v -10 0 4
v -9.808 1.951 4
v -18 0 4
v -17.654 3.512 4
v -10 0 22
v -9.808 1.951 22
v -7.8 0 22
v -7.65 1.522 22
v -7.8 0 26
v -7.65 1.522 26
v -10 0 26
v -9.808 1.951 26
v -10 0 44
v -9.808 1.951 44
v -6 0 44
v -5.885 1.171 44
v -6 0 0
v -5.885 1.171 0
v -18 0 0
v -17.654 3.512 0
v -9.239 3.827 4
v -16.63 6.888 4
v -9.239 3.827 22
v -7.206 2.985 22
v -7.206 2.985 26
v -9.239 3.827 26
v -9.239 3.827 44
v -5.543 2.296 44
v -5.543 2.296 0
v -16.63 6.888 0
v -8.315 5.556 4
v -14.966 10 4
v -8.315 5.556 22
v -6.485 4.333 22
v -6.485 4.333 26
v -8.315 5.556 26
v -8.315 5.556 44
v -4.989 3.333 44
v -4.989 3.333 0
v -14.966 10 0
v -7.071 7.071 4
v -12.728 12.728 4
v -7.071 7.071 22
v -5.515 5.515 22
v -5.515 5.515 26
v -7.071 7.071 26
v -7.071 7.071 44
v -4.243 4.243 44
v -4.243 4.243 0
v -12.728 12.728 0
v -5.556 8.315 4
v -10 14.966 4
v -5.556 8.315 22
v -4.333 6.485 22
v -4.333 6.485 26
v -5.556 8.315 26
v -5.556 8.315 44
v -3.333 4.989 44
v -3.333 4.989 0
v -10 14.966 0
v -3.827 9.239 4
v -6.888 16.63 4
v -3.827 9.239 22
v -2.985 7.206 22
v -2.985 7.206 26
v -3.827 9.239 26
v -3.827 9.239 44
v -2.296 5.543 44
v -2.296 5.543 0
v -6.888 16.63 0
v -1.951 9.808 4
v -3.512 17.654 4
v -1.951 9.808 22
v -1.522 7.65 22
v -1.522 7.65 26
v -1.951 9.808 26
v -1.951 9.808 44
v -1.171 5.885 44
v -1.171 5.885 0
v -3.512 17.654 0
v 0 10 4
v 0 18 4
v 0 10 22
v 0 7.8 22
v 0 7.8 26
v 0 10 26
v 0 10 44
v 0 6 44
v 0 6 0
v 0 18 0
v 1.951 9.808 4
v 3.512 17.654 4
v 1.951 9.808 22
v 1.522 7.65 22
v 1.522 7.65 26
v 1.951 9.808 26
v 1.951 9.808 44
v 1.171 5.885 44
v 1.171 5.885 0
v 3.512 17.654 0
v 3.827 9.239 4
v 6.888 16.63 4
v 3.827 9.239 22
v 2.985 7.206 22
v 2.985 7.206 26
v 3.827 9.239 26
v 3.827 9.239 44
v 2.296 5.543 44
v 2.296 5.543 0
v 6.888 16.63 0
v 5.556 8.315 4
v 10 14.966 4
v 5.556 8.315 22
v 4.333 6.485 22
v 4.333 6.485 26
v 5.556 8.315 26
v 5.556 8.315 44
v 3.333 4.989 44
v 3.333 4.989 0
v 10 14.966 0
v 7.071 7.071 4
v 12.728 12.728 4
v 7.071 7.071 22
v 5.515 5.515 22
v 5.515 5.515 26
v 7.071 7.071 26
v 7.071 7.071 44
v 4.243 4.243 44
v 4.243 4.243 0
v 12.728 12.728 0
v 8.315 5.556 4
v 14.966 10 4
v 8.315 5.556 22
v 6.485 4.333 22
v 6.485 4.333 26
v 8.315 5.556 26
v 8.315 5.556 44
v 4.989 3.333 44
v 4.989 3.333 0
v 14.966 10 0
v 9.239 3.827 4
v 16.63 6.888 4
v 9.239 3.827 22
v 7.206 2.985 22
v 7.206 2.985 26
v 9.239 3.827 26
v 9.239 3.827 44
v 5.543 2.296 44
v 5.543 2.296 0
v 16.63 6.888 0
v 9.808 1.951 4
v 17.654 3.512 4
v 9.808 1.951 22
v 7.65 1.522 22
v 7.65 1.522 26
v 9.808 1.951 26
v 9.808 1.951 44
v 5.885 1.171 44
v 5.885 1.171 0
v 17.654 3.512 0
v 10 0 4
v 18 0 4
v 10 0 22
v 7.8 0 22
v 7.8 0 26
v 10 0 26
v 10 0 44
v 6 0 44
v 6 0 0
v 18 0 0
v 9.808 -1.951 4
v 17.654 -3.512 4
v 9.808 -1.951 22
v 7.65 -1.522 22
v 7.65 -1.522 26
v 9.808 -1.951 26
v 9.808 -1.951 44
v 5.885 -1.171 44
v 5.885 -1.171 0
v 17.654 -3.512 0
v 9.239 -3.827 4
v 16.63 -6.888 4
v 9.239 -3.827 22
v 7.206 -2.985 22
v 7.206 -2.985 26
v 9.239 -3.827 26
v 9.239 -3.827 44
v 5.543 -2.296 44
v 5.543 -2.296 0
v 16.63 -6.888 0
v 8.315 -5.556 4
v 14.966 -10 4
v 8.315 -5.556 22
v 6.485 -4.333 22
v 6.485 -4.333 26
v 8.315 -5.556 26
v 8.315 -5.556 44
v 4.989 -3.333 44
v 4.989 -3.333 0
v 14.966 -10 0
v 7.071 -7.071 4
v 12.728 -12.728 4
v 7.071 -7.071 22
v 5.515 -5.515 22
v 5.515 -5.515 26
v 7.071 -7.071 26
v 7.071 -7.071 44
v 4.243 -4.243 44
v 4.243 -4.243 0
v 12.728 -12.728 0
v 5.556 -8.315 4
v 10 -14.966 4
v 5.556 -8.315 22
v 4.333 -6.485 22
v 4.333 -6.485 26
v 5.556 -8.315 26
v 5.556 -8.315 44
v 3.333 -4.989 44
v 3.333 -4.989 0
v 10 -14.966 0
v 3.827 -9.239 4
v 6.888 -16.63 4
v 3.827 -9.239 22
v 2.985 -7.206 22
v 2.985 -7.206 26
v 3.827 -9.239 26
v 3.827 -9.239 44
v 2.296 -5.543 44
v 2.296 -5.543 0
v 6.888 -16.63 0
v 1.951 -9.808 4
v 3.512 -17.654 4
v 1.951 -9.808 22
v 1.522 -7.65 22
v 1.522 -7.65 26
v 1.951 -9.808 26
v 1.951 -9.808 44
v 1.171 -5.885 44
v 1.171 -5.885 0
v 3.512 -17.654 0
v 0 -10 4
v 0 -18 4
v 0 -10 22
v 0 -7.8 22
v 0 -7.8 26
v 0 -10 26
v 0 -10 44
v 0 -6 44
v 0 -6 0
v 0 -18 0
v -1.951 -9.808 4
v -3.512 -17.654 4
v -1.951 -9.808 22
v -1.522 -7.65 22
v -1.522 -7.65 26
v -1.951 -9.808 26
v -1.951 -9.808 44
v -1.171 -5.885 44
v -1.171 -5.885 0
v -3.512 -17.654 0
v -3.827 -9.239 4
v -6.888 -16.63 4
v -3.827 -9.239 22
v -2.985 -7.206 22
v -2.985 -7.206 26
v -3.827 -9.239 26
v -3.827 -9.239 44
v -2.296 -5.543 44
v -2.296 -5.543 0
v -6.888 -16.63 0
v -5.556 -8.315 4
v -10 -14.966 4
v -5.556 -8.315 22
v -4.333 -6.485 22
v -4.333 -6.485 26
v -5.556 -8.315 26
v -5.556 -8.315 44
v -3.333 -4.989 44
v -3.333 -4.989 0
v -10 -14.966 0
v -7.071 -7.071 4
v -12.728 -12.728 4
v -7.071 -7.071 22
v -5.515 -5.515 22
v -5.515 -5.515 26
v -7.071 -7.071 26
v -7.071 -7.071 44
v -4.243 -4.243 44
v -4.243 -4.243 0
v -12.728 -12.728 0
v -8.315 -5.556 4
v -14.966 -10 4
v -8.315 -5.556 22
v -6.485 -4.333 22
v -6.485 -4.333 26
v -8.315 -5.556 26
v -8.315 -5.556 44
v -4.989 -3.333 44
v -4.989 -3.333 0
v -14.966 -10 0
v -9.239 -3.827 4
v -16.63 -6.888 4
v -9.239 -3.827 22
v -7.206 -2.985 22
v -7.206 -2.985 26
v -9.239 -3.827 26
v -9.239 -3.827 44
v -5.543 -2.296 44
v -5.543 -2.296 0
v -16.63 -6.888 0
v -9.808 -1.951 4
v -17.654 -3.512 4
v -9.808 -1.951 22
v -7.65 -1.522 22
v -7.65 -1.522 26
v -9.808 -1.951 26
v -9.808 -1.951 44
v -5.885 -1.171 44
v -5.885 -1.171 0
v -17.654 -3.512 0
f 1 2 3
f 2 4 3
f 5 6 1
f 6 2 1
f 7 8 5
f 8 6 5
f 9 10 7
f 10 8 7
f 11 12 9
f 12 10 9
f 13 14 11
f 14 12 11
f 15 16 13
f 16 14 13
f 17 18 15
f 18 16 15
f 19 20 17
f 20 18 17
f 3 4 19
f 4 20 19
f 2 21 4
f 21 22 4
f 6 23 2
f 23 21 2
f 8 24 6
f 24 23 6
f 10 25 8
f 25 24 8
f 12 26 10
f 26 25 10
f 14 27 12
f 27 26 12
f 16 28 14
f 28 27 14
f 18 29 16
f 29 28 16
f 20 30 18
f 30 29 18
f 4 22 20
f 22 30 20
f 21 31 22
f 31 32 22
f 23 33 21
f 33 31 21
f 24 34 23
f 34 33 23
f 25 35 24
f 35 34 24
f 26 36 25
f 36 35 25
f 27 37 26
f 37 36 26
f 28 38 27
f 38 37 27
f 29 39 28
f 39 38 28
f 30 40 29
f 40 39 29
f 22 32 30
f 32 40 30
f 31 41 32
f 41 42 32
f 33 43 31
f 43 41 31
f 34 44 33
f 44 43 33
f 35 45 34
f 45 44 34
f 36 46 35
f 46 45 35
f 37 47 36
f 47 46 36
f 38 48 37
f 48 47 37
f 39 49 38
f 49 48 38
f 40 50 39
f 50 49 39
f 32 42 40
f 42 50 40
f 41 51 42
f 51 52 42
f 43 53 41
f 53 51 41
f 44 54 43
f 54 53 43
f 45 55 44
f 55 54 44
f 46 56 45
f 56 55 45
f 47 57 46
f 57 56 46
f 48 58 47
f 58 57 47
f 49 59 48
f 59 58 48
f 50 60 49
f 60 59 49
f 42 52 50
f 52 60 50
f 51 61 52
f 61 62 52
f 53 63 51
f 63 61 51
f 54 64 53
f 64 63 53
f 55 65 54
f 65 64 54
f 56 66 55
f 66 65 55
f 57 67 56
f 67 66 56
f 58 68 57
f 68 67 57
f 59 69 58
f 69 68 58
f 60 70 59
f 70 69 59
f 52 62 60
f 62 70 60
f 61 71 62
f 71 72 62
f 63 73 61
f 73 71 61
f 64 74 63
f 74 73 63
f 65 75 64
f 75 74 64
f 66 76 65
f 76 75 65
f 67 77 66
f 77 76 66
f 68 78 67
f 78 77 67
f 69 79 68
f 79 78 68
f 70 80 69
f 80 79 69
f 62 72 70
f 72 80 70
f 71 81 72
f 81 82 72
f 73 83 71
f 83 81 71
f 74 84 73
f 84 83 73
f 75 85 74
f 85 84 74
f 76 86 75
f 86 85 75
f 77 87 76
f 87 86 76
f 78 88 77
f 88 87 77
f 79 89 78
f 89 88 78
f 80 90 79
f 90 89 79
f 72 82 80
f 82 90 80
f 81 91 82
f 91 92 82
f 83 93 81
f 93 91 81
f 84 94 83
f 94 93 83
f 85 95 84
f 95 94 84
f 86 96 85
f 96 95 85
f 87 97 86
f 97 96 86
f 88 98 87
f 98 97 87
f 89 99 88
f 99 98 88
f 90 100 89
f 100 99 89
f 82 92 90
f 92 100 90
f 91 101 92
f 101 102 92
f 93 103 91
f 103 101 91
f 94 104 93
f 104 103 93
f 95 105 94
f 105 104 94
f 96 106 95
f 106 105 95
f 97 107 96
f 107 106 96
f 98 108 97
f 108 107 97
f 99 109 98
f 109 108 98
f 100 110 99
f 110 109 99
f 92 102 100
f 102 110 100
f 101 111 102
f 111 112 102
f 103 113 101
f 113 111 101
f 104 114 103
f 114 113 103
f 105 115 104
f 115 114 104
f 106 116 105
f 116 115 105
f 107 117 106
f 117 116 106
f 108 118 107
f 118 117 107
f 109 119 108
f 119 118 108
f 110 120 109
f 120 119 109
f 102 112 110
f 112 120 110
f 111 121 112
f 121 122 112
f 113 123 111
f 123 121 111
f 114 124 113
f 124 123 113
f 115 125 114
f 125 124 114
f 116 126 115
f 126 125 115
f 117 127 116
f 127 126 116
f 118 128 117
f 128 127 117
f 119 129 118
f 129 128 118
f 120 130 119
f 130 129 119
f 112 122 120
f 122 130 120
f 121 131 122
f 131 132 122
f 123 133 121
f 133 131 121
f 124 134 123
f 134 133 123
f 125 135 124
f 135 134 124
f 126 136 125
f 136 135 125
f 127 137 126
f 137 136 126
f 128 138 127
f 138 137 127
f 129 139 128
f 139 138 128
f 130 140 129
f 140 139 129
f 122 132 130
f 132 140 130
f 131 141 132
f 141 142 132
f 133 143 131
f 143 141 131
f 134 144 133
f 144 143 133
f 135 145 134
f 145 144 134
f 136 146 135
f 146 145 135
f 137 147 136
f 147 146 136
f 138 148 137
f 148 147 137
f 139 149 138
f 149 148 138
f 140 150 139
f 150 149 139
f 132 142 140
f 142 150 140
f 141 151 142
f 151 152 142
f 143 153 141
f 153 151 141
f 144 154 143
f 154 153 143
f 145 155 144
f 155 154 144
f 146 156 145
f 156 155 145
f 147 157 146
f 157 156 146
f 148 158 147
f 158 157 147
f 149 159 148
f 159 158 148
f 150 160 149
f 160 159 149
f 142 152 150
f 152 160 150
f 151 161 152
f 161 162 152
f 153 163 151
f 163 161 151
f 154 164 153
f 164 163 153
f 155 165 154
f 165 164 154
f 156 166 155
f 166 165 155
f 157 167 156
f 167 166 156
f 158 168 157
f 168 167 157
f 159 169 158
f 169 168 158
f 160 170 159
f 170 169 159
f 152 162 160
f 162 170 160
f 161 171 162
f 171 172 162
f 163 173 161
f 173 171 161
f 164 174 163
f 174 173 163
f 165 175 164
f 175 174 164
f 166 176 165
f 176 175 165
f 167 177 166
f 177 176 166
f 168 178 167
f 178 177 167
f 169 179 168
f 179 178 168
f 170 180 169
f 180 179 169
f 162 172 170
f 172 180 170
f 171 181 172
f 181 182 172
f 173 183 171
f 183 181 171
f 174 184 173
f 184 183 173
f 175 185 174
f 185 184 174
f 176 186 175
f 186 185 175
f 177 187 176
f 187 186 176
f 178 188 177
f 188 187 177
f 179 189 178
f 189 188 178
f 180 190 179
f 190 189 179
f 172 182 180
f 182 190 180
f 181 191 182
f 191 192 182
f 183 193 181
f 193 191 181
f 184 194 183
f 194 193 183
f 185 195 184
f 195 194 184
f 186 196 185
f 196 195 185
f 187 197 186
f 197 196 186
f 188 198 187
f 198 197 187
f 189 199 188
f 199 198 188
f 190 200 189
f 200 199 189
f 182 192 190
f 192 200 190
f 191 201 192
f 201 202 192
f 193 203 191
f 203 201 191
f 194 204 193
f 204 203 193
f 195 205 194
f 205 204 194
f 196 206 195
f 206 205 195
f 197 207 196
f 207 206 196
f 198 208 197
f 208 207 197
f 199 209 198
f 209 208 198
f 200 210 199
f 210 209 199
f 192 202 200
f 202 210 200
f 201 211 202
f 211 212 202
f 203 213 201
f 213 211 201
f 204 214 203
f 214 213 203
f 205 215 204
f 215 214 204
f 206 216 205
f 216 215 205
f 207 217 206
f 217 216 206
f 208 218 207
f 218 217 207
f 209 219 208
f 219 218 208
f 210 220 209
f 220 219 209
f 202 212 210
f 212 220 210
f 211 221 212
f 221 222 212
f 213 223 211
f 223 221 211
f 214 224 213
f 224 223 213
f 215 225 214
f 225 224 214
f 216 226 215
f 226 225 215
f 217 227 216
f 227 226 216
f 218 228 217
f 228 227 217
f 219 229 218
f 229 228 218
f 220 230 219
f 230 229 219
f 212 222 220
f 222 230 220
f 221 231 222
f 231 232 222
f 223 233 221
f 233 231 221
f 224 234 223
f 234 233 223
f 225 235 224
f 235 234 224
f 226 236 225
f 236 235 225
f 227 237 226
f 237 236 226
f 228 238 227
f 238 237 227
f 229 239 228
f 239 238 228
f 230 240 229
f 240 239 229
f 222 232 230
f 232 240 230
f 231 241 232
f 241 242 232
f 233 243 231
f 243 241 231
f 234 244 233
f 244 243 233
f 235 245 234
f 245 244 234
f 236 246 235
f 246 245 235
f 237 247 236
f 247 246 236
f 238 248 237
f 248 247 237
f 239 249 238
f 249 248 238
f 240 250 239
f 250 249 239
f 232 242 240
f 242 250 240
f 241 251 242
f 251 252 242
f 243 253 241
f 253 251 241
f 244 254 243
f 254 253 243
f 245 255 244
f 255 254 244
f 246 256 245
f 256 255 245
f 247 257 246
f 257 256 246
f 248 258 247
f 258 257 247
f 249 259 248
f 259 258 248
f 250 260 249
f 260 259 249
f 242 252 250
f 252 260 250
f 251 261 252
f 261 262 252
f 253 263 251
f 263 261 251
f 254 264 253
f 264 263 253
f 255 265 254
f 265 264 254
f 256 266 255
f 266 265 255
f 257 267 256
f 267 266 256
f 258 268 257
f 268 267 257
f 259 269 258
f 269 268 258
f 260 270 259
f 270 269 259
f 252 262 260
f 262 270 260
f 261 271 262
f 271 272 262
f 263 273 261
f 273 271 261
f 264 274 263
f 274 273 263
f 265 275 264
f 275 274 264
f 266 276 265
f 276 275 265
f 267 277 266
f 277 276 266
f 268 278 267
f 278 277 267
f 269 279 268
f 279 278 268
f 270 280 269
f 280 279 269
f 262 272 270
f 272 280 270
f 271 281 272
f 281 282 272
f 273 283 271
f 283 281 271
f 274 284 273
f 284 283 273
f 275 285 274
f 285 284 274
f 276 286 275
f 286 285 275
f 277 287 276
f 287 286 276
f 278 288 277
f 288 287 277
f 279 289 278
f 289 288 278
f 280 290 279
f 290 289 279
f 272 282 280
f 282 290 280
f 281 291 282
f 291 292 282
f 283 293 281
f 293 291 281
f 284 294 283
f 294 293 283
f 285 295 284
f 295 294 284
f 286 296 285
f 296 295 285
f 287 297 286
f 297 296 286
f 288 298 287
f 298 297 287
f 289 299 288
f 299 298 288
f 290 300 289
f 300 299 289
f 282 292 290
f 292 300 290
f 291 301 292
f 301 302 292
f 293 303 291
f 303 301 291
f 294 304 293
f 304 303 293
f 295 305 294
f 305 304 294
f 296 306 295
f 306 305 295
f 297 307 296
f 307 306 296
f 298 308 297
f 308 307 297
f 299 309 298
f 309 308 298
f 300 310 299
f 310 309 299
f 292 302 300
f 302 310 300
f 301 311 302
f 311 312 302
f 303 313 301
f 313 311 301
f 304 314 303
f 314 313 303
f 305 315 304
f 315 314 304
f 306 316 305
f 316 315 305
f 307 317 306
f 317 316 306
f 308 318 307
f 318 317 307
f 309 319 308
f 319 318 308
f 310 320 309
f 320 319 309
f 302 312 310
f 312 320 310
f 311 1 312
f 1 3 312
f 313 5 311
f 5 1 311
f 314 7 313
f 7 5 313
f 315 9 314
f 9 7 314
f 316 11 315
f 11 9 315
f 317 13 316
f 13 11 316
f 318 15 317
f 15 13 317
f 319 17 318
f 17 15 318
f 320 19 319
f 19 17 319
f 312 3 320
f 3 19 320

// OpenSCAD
$fn = 32;

// ----------------------------------------------------------------------
// Grooved revolve: flanged, bore R6
// ----------------------------------------------------------------------

// --- parameters (mm) ---
bore_r = 6;               // bore radius
outer_r = 10;             // outer radius of the body
total_h = 44;             // overall height, Z
wall = 4;                 // radial wall thickness
groove_w = 4;             // groove width
groove_d = 2.2;           // groove depth
grooves = 1;              // number of outer grooves
flange_r = 18;            // flange radius
flange_h = 4;             // flange height

bbox_x = 2 * flange_r;  // full diameter
bore_d = 2 * bore_r;  // bore diameter
body_d = 2 * outer_r;  // body diameter
flange_d = 2 * flange_r;  // flange diameter
revolve_angle = 360;  // full turn around the Z axis

profile = [[6, 0], [10, 0], [18, 0], [18, 4], [10, 4], [10, 22], [7.8, 22], [7.8, 26], [10, 26], [10, 44], [6, 44]];  // primary outline, 11 points, counter clockwise

// --- the one profile operation ---
rotate_extrude(angle = revolve_angle) polygon(points = profile);
